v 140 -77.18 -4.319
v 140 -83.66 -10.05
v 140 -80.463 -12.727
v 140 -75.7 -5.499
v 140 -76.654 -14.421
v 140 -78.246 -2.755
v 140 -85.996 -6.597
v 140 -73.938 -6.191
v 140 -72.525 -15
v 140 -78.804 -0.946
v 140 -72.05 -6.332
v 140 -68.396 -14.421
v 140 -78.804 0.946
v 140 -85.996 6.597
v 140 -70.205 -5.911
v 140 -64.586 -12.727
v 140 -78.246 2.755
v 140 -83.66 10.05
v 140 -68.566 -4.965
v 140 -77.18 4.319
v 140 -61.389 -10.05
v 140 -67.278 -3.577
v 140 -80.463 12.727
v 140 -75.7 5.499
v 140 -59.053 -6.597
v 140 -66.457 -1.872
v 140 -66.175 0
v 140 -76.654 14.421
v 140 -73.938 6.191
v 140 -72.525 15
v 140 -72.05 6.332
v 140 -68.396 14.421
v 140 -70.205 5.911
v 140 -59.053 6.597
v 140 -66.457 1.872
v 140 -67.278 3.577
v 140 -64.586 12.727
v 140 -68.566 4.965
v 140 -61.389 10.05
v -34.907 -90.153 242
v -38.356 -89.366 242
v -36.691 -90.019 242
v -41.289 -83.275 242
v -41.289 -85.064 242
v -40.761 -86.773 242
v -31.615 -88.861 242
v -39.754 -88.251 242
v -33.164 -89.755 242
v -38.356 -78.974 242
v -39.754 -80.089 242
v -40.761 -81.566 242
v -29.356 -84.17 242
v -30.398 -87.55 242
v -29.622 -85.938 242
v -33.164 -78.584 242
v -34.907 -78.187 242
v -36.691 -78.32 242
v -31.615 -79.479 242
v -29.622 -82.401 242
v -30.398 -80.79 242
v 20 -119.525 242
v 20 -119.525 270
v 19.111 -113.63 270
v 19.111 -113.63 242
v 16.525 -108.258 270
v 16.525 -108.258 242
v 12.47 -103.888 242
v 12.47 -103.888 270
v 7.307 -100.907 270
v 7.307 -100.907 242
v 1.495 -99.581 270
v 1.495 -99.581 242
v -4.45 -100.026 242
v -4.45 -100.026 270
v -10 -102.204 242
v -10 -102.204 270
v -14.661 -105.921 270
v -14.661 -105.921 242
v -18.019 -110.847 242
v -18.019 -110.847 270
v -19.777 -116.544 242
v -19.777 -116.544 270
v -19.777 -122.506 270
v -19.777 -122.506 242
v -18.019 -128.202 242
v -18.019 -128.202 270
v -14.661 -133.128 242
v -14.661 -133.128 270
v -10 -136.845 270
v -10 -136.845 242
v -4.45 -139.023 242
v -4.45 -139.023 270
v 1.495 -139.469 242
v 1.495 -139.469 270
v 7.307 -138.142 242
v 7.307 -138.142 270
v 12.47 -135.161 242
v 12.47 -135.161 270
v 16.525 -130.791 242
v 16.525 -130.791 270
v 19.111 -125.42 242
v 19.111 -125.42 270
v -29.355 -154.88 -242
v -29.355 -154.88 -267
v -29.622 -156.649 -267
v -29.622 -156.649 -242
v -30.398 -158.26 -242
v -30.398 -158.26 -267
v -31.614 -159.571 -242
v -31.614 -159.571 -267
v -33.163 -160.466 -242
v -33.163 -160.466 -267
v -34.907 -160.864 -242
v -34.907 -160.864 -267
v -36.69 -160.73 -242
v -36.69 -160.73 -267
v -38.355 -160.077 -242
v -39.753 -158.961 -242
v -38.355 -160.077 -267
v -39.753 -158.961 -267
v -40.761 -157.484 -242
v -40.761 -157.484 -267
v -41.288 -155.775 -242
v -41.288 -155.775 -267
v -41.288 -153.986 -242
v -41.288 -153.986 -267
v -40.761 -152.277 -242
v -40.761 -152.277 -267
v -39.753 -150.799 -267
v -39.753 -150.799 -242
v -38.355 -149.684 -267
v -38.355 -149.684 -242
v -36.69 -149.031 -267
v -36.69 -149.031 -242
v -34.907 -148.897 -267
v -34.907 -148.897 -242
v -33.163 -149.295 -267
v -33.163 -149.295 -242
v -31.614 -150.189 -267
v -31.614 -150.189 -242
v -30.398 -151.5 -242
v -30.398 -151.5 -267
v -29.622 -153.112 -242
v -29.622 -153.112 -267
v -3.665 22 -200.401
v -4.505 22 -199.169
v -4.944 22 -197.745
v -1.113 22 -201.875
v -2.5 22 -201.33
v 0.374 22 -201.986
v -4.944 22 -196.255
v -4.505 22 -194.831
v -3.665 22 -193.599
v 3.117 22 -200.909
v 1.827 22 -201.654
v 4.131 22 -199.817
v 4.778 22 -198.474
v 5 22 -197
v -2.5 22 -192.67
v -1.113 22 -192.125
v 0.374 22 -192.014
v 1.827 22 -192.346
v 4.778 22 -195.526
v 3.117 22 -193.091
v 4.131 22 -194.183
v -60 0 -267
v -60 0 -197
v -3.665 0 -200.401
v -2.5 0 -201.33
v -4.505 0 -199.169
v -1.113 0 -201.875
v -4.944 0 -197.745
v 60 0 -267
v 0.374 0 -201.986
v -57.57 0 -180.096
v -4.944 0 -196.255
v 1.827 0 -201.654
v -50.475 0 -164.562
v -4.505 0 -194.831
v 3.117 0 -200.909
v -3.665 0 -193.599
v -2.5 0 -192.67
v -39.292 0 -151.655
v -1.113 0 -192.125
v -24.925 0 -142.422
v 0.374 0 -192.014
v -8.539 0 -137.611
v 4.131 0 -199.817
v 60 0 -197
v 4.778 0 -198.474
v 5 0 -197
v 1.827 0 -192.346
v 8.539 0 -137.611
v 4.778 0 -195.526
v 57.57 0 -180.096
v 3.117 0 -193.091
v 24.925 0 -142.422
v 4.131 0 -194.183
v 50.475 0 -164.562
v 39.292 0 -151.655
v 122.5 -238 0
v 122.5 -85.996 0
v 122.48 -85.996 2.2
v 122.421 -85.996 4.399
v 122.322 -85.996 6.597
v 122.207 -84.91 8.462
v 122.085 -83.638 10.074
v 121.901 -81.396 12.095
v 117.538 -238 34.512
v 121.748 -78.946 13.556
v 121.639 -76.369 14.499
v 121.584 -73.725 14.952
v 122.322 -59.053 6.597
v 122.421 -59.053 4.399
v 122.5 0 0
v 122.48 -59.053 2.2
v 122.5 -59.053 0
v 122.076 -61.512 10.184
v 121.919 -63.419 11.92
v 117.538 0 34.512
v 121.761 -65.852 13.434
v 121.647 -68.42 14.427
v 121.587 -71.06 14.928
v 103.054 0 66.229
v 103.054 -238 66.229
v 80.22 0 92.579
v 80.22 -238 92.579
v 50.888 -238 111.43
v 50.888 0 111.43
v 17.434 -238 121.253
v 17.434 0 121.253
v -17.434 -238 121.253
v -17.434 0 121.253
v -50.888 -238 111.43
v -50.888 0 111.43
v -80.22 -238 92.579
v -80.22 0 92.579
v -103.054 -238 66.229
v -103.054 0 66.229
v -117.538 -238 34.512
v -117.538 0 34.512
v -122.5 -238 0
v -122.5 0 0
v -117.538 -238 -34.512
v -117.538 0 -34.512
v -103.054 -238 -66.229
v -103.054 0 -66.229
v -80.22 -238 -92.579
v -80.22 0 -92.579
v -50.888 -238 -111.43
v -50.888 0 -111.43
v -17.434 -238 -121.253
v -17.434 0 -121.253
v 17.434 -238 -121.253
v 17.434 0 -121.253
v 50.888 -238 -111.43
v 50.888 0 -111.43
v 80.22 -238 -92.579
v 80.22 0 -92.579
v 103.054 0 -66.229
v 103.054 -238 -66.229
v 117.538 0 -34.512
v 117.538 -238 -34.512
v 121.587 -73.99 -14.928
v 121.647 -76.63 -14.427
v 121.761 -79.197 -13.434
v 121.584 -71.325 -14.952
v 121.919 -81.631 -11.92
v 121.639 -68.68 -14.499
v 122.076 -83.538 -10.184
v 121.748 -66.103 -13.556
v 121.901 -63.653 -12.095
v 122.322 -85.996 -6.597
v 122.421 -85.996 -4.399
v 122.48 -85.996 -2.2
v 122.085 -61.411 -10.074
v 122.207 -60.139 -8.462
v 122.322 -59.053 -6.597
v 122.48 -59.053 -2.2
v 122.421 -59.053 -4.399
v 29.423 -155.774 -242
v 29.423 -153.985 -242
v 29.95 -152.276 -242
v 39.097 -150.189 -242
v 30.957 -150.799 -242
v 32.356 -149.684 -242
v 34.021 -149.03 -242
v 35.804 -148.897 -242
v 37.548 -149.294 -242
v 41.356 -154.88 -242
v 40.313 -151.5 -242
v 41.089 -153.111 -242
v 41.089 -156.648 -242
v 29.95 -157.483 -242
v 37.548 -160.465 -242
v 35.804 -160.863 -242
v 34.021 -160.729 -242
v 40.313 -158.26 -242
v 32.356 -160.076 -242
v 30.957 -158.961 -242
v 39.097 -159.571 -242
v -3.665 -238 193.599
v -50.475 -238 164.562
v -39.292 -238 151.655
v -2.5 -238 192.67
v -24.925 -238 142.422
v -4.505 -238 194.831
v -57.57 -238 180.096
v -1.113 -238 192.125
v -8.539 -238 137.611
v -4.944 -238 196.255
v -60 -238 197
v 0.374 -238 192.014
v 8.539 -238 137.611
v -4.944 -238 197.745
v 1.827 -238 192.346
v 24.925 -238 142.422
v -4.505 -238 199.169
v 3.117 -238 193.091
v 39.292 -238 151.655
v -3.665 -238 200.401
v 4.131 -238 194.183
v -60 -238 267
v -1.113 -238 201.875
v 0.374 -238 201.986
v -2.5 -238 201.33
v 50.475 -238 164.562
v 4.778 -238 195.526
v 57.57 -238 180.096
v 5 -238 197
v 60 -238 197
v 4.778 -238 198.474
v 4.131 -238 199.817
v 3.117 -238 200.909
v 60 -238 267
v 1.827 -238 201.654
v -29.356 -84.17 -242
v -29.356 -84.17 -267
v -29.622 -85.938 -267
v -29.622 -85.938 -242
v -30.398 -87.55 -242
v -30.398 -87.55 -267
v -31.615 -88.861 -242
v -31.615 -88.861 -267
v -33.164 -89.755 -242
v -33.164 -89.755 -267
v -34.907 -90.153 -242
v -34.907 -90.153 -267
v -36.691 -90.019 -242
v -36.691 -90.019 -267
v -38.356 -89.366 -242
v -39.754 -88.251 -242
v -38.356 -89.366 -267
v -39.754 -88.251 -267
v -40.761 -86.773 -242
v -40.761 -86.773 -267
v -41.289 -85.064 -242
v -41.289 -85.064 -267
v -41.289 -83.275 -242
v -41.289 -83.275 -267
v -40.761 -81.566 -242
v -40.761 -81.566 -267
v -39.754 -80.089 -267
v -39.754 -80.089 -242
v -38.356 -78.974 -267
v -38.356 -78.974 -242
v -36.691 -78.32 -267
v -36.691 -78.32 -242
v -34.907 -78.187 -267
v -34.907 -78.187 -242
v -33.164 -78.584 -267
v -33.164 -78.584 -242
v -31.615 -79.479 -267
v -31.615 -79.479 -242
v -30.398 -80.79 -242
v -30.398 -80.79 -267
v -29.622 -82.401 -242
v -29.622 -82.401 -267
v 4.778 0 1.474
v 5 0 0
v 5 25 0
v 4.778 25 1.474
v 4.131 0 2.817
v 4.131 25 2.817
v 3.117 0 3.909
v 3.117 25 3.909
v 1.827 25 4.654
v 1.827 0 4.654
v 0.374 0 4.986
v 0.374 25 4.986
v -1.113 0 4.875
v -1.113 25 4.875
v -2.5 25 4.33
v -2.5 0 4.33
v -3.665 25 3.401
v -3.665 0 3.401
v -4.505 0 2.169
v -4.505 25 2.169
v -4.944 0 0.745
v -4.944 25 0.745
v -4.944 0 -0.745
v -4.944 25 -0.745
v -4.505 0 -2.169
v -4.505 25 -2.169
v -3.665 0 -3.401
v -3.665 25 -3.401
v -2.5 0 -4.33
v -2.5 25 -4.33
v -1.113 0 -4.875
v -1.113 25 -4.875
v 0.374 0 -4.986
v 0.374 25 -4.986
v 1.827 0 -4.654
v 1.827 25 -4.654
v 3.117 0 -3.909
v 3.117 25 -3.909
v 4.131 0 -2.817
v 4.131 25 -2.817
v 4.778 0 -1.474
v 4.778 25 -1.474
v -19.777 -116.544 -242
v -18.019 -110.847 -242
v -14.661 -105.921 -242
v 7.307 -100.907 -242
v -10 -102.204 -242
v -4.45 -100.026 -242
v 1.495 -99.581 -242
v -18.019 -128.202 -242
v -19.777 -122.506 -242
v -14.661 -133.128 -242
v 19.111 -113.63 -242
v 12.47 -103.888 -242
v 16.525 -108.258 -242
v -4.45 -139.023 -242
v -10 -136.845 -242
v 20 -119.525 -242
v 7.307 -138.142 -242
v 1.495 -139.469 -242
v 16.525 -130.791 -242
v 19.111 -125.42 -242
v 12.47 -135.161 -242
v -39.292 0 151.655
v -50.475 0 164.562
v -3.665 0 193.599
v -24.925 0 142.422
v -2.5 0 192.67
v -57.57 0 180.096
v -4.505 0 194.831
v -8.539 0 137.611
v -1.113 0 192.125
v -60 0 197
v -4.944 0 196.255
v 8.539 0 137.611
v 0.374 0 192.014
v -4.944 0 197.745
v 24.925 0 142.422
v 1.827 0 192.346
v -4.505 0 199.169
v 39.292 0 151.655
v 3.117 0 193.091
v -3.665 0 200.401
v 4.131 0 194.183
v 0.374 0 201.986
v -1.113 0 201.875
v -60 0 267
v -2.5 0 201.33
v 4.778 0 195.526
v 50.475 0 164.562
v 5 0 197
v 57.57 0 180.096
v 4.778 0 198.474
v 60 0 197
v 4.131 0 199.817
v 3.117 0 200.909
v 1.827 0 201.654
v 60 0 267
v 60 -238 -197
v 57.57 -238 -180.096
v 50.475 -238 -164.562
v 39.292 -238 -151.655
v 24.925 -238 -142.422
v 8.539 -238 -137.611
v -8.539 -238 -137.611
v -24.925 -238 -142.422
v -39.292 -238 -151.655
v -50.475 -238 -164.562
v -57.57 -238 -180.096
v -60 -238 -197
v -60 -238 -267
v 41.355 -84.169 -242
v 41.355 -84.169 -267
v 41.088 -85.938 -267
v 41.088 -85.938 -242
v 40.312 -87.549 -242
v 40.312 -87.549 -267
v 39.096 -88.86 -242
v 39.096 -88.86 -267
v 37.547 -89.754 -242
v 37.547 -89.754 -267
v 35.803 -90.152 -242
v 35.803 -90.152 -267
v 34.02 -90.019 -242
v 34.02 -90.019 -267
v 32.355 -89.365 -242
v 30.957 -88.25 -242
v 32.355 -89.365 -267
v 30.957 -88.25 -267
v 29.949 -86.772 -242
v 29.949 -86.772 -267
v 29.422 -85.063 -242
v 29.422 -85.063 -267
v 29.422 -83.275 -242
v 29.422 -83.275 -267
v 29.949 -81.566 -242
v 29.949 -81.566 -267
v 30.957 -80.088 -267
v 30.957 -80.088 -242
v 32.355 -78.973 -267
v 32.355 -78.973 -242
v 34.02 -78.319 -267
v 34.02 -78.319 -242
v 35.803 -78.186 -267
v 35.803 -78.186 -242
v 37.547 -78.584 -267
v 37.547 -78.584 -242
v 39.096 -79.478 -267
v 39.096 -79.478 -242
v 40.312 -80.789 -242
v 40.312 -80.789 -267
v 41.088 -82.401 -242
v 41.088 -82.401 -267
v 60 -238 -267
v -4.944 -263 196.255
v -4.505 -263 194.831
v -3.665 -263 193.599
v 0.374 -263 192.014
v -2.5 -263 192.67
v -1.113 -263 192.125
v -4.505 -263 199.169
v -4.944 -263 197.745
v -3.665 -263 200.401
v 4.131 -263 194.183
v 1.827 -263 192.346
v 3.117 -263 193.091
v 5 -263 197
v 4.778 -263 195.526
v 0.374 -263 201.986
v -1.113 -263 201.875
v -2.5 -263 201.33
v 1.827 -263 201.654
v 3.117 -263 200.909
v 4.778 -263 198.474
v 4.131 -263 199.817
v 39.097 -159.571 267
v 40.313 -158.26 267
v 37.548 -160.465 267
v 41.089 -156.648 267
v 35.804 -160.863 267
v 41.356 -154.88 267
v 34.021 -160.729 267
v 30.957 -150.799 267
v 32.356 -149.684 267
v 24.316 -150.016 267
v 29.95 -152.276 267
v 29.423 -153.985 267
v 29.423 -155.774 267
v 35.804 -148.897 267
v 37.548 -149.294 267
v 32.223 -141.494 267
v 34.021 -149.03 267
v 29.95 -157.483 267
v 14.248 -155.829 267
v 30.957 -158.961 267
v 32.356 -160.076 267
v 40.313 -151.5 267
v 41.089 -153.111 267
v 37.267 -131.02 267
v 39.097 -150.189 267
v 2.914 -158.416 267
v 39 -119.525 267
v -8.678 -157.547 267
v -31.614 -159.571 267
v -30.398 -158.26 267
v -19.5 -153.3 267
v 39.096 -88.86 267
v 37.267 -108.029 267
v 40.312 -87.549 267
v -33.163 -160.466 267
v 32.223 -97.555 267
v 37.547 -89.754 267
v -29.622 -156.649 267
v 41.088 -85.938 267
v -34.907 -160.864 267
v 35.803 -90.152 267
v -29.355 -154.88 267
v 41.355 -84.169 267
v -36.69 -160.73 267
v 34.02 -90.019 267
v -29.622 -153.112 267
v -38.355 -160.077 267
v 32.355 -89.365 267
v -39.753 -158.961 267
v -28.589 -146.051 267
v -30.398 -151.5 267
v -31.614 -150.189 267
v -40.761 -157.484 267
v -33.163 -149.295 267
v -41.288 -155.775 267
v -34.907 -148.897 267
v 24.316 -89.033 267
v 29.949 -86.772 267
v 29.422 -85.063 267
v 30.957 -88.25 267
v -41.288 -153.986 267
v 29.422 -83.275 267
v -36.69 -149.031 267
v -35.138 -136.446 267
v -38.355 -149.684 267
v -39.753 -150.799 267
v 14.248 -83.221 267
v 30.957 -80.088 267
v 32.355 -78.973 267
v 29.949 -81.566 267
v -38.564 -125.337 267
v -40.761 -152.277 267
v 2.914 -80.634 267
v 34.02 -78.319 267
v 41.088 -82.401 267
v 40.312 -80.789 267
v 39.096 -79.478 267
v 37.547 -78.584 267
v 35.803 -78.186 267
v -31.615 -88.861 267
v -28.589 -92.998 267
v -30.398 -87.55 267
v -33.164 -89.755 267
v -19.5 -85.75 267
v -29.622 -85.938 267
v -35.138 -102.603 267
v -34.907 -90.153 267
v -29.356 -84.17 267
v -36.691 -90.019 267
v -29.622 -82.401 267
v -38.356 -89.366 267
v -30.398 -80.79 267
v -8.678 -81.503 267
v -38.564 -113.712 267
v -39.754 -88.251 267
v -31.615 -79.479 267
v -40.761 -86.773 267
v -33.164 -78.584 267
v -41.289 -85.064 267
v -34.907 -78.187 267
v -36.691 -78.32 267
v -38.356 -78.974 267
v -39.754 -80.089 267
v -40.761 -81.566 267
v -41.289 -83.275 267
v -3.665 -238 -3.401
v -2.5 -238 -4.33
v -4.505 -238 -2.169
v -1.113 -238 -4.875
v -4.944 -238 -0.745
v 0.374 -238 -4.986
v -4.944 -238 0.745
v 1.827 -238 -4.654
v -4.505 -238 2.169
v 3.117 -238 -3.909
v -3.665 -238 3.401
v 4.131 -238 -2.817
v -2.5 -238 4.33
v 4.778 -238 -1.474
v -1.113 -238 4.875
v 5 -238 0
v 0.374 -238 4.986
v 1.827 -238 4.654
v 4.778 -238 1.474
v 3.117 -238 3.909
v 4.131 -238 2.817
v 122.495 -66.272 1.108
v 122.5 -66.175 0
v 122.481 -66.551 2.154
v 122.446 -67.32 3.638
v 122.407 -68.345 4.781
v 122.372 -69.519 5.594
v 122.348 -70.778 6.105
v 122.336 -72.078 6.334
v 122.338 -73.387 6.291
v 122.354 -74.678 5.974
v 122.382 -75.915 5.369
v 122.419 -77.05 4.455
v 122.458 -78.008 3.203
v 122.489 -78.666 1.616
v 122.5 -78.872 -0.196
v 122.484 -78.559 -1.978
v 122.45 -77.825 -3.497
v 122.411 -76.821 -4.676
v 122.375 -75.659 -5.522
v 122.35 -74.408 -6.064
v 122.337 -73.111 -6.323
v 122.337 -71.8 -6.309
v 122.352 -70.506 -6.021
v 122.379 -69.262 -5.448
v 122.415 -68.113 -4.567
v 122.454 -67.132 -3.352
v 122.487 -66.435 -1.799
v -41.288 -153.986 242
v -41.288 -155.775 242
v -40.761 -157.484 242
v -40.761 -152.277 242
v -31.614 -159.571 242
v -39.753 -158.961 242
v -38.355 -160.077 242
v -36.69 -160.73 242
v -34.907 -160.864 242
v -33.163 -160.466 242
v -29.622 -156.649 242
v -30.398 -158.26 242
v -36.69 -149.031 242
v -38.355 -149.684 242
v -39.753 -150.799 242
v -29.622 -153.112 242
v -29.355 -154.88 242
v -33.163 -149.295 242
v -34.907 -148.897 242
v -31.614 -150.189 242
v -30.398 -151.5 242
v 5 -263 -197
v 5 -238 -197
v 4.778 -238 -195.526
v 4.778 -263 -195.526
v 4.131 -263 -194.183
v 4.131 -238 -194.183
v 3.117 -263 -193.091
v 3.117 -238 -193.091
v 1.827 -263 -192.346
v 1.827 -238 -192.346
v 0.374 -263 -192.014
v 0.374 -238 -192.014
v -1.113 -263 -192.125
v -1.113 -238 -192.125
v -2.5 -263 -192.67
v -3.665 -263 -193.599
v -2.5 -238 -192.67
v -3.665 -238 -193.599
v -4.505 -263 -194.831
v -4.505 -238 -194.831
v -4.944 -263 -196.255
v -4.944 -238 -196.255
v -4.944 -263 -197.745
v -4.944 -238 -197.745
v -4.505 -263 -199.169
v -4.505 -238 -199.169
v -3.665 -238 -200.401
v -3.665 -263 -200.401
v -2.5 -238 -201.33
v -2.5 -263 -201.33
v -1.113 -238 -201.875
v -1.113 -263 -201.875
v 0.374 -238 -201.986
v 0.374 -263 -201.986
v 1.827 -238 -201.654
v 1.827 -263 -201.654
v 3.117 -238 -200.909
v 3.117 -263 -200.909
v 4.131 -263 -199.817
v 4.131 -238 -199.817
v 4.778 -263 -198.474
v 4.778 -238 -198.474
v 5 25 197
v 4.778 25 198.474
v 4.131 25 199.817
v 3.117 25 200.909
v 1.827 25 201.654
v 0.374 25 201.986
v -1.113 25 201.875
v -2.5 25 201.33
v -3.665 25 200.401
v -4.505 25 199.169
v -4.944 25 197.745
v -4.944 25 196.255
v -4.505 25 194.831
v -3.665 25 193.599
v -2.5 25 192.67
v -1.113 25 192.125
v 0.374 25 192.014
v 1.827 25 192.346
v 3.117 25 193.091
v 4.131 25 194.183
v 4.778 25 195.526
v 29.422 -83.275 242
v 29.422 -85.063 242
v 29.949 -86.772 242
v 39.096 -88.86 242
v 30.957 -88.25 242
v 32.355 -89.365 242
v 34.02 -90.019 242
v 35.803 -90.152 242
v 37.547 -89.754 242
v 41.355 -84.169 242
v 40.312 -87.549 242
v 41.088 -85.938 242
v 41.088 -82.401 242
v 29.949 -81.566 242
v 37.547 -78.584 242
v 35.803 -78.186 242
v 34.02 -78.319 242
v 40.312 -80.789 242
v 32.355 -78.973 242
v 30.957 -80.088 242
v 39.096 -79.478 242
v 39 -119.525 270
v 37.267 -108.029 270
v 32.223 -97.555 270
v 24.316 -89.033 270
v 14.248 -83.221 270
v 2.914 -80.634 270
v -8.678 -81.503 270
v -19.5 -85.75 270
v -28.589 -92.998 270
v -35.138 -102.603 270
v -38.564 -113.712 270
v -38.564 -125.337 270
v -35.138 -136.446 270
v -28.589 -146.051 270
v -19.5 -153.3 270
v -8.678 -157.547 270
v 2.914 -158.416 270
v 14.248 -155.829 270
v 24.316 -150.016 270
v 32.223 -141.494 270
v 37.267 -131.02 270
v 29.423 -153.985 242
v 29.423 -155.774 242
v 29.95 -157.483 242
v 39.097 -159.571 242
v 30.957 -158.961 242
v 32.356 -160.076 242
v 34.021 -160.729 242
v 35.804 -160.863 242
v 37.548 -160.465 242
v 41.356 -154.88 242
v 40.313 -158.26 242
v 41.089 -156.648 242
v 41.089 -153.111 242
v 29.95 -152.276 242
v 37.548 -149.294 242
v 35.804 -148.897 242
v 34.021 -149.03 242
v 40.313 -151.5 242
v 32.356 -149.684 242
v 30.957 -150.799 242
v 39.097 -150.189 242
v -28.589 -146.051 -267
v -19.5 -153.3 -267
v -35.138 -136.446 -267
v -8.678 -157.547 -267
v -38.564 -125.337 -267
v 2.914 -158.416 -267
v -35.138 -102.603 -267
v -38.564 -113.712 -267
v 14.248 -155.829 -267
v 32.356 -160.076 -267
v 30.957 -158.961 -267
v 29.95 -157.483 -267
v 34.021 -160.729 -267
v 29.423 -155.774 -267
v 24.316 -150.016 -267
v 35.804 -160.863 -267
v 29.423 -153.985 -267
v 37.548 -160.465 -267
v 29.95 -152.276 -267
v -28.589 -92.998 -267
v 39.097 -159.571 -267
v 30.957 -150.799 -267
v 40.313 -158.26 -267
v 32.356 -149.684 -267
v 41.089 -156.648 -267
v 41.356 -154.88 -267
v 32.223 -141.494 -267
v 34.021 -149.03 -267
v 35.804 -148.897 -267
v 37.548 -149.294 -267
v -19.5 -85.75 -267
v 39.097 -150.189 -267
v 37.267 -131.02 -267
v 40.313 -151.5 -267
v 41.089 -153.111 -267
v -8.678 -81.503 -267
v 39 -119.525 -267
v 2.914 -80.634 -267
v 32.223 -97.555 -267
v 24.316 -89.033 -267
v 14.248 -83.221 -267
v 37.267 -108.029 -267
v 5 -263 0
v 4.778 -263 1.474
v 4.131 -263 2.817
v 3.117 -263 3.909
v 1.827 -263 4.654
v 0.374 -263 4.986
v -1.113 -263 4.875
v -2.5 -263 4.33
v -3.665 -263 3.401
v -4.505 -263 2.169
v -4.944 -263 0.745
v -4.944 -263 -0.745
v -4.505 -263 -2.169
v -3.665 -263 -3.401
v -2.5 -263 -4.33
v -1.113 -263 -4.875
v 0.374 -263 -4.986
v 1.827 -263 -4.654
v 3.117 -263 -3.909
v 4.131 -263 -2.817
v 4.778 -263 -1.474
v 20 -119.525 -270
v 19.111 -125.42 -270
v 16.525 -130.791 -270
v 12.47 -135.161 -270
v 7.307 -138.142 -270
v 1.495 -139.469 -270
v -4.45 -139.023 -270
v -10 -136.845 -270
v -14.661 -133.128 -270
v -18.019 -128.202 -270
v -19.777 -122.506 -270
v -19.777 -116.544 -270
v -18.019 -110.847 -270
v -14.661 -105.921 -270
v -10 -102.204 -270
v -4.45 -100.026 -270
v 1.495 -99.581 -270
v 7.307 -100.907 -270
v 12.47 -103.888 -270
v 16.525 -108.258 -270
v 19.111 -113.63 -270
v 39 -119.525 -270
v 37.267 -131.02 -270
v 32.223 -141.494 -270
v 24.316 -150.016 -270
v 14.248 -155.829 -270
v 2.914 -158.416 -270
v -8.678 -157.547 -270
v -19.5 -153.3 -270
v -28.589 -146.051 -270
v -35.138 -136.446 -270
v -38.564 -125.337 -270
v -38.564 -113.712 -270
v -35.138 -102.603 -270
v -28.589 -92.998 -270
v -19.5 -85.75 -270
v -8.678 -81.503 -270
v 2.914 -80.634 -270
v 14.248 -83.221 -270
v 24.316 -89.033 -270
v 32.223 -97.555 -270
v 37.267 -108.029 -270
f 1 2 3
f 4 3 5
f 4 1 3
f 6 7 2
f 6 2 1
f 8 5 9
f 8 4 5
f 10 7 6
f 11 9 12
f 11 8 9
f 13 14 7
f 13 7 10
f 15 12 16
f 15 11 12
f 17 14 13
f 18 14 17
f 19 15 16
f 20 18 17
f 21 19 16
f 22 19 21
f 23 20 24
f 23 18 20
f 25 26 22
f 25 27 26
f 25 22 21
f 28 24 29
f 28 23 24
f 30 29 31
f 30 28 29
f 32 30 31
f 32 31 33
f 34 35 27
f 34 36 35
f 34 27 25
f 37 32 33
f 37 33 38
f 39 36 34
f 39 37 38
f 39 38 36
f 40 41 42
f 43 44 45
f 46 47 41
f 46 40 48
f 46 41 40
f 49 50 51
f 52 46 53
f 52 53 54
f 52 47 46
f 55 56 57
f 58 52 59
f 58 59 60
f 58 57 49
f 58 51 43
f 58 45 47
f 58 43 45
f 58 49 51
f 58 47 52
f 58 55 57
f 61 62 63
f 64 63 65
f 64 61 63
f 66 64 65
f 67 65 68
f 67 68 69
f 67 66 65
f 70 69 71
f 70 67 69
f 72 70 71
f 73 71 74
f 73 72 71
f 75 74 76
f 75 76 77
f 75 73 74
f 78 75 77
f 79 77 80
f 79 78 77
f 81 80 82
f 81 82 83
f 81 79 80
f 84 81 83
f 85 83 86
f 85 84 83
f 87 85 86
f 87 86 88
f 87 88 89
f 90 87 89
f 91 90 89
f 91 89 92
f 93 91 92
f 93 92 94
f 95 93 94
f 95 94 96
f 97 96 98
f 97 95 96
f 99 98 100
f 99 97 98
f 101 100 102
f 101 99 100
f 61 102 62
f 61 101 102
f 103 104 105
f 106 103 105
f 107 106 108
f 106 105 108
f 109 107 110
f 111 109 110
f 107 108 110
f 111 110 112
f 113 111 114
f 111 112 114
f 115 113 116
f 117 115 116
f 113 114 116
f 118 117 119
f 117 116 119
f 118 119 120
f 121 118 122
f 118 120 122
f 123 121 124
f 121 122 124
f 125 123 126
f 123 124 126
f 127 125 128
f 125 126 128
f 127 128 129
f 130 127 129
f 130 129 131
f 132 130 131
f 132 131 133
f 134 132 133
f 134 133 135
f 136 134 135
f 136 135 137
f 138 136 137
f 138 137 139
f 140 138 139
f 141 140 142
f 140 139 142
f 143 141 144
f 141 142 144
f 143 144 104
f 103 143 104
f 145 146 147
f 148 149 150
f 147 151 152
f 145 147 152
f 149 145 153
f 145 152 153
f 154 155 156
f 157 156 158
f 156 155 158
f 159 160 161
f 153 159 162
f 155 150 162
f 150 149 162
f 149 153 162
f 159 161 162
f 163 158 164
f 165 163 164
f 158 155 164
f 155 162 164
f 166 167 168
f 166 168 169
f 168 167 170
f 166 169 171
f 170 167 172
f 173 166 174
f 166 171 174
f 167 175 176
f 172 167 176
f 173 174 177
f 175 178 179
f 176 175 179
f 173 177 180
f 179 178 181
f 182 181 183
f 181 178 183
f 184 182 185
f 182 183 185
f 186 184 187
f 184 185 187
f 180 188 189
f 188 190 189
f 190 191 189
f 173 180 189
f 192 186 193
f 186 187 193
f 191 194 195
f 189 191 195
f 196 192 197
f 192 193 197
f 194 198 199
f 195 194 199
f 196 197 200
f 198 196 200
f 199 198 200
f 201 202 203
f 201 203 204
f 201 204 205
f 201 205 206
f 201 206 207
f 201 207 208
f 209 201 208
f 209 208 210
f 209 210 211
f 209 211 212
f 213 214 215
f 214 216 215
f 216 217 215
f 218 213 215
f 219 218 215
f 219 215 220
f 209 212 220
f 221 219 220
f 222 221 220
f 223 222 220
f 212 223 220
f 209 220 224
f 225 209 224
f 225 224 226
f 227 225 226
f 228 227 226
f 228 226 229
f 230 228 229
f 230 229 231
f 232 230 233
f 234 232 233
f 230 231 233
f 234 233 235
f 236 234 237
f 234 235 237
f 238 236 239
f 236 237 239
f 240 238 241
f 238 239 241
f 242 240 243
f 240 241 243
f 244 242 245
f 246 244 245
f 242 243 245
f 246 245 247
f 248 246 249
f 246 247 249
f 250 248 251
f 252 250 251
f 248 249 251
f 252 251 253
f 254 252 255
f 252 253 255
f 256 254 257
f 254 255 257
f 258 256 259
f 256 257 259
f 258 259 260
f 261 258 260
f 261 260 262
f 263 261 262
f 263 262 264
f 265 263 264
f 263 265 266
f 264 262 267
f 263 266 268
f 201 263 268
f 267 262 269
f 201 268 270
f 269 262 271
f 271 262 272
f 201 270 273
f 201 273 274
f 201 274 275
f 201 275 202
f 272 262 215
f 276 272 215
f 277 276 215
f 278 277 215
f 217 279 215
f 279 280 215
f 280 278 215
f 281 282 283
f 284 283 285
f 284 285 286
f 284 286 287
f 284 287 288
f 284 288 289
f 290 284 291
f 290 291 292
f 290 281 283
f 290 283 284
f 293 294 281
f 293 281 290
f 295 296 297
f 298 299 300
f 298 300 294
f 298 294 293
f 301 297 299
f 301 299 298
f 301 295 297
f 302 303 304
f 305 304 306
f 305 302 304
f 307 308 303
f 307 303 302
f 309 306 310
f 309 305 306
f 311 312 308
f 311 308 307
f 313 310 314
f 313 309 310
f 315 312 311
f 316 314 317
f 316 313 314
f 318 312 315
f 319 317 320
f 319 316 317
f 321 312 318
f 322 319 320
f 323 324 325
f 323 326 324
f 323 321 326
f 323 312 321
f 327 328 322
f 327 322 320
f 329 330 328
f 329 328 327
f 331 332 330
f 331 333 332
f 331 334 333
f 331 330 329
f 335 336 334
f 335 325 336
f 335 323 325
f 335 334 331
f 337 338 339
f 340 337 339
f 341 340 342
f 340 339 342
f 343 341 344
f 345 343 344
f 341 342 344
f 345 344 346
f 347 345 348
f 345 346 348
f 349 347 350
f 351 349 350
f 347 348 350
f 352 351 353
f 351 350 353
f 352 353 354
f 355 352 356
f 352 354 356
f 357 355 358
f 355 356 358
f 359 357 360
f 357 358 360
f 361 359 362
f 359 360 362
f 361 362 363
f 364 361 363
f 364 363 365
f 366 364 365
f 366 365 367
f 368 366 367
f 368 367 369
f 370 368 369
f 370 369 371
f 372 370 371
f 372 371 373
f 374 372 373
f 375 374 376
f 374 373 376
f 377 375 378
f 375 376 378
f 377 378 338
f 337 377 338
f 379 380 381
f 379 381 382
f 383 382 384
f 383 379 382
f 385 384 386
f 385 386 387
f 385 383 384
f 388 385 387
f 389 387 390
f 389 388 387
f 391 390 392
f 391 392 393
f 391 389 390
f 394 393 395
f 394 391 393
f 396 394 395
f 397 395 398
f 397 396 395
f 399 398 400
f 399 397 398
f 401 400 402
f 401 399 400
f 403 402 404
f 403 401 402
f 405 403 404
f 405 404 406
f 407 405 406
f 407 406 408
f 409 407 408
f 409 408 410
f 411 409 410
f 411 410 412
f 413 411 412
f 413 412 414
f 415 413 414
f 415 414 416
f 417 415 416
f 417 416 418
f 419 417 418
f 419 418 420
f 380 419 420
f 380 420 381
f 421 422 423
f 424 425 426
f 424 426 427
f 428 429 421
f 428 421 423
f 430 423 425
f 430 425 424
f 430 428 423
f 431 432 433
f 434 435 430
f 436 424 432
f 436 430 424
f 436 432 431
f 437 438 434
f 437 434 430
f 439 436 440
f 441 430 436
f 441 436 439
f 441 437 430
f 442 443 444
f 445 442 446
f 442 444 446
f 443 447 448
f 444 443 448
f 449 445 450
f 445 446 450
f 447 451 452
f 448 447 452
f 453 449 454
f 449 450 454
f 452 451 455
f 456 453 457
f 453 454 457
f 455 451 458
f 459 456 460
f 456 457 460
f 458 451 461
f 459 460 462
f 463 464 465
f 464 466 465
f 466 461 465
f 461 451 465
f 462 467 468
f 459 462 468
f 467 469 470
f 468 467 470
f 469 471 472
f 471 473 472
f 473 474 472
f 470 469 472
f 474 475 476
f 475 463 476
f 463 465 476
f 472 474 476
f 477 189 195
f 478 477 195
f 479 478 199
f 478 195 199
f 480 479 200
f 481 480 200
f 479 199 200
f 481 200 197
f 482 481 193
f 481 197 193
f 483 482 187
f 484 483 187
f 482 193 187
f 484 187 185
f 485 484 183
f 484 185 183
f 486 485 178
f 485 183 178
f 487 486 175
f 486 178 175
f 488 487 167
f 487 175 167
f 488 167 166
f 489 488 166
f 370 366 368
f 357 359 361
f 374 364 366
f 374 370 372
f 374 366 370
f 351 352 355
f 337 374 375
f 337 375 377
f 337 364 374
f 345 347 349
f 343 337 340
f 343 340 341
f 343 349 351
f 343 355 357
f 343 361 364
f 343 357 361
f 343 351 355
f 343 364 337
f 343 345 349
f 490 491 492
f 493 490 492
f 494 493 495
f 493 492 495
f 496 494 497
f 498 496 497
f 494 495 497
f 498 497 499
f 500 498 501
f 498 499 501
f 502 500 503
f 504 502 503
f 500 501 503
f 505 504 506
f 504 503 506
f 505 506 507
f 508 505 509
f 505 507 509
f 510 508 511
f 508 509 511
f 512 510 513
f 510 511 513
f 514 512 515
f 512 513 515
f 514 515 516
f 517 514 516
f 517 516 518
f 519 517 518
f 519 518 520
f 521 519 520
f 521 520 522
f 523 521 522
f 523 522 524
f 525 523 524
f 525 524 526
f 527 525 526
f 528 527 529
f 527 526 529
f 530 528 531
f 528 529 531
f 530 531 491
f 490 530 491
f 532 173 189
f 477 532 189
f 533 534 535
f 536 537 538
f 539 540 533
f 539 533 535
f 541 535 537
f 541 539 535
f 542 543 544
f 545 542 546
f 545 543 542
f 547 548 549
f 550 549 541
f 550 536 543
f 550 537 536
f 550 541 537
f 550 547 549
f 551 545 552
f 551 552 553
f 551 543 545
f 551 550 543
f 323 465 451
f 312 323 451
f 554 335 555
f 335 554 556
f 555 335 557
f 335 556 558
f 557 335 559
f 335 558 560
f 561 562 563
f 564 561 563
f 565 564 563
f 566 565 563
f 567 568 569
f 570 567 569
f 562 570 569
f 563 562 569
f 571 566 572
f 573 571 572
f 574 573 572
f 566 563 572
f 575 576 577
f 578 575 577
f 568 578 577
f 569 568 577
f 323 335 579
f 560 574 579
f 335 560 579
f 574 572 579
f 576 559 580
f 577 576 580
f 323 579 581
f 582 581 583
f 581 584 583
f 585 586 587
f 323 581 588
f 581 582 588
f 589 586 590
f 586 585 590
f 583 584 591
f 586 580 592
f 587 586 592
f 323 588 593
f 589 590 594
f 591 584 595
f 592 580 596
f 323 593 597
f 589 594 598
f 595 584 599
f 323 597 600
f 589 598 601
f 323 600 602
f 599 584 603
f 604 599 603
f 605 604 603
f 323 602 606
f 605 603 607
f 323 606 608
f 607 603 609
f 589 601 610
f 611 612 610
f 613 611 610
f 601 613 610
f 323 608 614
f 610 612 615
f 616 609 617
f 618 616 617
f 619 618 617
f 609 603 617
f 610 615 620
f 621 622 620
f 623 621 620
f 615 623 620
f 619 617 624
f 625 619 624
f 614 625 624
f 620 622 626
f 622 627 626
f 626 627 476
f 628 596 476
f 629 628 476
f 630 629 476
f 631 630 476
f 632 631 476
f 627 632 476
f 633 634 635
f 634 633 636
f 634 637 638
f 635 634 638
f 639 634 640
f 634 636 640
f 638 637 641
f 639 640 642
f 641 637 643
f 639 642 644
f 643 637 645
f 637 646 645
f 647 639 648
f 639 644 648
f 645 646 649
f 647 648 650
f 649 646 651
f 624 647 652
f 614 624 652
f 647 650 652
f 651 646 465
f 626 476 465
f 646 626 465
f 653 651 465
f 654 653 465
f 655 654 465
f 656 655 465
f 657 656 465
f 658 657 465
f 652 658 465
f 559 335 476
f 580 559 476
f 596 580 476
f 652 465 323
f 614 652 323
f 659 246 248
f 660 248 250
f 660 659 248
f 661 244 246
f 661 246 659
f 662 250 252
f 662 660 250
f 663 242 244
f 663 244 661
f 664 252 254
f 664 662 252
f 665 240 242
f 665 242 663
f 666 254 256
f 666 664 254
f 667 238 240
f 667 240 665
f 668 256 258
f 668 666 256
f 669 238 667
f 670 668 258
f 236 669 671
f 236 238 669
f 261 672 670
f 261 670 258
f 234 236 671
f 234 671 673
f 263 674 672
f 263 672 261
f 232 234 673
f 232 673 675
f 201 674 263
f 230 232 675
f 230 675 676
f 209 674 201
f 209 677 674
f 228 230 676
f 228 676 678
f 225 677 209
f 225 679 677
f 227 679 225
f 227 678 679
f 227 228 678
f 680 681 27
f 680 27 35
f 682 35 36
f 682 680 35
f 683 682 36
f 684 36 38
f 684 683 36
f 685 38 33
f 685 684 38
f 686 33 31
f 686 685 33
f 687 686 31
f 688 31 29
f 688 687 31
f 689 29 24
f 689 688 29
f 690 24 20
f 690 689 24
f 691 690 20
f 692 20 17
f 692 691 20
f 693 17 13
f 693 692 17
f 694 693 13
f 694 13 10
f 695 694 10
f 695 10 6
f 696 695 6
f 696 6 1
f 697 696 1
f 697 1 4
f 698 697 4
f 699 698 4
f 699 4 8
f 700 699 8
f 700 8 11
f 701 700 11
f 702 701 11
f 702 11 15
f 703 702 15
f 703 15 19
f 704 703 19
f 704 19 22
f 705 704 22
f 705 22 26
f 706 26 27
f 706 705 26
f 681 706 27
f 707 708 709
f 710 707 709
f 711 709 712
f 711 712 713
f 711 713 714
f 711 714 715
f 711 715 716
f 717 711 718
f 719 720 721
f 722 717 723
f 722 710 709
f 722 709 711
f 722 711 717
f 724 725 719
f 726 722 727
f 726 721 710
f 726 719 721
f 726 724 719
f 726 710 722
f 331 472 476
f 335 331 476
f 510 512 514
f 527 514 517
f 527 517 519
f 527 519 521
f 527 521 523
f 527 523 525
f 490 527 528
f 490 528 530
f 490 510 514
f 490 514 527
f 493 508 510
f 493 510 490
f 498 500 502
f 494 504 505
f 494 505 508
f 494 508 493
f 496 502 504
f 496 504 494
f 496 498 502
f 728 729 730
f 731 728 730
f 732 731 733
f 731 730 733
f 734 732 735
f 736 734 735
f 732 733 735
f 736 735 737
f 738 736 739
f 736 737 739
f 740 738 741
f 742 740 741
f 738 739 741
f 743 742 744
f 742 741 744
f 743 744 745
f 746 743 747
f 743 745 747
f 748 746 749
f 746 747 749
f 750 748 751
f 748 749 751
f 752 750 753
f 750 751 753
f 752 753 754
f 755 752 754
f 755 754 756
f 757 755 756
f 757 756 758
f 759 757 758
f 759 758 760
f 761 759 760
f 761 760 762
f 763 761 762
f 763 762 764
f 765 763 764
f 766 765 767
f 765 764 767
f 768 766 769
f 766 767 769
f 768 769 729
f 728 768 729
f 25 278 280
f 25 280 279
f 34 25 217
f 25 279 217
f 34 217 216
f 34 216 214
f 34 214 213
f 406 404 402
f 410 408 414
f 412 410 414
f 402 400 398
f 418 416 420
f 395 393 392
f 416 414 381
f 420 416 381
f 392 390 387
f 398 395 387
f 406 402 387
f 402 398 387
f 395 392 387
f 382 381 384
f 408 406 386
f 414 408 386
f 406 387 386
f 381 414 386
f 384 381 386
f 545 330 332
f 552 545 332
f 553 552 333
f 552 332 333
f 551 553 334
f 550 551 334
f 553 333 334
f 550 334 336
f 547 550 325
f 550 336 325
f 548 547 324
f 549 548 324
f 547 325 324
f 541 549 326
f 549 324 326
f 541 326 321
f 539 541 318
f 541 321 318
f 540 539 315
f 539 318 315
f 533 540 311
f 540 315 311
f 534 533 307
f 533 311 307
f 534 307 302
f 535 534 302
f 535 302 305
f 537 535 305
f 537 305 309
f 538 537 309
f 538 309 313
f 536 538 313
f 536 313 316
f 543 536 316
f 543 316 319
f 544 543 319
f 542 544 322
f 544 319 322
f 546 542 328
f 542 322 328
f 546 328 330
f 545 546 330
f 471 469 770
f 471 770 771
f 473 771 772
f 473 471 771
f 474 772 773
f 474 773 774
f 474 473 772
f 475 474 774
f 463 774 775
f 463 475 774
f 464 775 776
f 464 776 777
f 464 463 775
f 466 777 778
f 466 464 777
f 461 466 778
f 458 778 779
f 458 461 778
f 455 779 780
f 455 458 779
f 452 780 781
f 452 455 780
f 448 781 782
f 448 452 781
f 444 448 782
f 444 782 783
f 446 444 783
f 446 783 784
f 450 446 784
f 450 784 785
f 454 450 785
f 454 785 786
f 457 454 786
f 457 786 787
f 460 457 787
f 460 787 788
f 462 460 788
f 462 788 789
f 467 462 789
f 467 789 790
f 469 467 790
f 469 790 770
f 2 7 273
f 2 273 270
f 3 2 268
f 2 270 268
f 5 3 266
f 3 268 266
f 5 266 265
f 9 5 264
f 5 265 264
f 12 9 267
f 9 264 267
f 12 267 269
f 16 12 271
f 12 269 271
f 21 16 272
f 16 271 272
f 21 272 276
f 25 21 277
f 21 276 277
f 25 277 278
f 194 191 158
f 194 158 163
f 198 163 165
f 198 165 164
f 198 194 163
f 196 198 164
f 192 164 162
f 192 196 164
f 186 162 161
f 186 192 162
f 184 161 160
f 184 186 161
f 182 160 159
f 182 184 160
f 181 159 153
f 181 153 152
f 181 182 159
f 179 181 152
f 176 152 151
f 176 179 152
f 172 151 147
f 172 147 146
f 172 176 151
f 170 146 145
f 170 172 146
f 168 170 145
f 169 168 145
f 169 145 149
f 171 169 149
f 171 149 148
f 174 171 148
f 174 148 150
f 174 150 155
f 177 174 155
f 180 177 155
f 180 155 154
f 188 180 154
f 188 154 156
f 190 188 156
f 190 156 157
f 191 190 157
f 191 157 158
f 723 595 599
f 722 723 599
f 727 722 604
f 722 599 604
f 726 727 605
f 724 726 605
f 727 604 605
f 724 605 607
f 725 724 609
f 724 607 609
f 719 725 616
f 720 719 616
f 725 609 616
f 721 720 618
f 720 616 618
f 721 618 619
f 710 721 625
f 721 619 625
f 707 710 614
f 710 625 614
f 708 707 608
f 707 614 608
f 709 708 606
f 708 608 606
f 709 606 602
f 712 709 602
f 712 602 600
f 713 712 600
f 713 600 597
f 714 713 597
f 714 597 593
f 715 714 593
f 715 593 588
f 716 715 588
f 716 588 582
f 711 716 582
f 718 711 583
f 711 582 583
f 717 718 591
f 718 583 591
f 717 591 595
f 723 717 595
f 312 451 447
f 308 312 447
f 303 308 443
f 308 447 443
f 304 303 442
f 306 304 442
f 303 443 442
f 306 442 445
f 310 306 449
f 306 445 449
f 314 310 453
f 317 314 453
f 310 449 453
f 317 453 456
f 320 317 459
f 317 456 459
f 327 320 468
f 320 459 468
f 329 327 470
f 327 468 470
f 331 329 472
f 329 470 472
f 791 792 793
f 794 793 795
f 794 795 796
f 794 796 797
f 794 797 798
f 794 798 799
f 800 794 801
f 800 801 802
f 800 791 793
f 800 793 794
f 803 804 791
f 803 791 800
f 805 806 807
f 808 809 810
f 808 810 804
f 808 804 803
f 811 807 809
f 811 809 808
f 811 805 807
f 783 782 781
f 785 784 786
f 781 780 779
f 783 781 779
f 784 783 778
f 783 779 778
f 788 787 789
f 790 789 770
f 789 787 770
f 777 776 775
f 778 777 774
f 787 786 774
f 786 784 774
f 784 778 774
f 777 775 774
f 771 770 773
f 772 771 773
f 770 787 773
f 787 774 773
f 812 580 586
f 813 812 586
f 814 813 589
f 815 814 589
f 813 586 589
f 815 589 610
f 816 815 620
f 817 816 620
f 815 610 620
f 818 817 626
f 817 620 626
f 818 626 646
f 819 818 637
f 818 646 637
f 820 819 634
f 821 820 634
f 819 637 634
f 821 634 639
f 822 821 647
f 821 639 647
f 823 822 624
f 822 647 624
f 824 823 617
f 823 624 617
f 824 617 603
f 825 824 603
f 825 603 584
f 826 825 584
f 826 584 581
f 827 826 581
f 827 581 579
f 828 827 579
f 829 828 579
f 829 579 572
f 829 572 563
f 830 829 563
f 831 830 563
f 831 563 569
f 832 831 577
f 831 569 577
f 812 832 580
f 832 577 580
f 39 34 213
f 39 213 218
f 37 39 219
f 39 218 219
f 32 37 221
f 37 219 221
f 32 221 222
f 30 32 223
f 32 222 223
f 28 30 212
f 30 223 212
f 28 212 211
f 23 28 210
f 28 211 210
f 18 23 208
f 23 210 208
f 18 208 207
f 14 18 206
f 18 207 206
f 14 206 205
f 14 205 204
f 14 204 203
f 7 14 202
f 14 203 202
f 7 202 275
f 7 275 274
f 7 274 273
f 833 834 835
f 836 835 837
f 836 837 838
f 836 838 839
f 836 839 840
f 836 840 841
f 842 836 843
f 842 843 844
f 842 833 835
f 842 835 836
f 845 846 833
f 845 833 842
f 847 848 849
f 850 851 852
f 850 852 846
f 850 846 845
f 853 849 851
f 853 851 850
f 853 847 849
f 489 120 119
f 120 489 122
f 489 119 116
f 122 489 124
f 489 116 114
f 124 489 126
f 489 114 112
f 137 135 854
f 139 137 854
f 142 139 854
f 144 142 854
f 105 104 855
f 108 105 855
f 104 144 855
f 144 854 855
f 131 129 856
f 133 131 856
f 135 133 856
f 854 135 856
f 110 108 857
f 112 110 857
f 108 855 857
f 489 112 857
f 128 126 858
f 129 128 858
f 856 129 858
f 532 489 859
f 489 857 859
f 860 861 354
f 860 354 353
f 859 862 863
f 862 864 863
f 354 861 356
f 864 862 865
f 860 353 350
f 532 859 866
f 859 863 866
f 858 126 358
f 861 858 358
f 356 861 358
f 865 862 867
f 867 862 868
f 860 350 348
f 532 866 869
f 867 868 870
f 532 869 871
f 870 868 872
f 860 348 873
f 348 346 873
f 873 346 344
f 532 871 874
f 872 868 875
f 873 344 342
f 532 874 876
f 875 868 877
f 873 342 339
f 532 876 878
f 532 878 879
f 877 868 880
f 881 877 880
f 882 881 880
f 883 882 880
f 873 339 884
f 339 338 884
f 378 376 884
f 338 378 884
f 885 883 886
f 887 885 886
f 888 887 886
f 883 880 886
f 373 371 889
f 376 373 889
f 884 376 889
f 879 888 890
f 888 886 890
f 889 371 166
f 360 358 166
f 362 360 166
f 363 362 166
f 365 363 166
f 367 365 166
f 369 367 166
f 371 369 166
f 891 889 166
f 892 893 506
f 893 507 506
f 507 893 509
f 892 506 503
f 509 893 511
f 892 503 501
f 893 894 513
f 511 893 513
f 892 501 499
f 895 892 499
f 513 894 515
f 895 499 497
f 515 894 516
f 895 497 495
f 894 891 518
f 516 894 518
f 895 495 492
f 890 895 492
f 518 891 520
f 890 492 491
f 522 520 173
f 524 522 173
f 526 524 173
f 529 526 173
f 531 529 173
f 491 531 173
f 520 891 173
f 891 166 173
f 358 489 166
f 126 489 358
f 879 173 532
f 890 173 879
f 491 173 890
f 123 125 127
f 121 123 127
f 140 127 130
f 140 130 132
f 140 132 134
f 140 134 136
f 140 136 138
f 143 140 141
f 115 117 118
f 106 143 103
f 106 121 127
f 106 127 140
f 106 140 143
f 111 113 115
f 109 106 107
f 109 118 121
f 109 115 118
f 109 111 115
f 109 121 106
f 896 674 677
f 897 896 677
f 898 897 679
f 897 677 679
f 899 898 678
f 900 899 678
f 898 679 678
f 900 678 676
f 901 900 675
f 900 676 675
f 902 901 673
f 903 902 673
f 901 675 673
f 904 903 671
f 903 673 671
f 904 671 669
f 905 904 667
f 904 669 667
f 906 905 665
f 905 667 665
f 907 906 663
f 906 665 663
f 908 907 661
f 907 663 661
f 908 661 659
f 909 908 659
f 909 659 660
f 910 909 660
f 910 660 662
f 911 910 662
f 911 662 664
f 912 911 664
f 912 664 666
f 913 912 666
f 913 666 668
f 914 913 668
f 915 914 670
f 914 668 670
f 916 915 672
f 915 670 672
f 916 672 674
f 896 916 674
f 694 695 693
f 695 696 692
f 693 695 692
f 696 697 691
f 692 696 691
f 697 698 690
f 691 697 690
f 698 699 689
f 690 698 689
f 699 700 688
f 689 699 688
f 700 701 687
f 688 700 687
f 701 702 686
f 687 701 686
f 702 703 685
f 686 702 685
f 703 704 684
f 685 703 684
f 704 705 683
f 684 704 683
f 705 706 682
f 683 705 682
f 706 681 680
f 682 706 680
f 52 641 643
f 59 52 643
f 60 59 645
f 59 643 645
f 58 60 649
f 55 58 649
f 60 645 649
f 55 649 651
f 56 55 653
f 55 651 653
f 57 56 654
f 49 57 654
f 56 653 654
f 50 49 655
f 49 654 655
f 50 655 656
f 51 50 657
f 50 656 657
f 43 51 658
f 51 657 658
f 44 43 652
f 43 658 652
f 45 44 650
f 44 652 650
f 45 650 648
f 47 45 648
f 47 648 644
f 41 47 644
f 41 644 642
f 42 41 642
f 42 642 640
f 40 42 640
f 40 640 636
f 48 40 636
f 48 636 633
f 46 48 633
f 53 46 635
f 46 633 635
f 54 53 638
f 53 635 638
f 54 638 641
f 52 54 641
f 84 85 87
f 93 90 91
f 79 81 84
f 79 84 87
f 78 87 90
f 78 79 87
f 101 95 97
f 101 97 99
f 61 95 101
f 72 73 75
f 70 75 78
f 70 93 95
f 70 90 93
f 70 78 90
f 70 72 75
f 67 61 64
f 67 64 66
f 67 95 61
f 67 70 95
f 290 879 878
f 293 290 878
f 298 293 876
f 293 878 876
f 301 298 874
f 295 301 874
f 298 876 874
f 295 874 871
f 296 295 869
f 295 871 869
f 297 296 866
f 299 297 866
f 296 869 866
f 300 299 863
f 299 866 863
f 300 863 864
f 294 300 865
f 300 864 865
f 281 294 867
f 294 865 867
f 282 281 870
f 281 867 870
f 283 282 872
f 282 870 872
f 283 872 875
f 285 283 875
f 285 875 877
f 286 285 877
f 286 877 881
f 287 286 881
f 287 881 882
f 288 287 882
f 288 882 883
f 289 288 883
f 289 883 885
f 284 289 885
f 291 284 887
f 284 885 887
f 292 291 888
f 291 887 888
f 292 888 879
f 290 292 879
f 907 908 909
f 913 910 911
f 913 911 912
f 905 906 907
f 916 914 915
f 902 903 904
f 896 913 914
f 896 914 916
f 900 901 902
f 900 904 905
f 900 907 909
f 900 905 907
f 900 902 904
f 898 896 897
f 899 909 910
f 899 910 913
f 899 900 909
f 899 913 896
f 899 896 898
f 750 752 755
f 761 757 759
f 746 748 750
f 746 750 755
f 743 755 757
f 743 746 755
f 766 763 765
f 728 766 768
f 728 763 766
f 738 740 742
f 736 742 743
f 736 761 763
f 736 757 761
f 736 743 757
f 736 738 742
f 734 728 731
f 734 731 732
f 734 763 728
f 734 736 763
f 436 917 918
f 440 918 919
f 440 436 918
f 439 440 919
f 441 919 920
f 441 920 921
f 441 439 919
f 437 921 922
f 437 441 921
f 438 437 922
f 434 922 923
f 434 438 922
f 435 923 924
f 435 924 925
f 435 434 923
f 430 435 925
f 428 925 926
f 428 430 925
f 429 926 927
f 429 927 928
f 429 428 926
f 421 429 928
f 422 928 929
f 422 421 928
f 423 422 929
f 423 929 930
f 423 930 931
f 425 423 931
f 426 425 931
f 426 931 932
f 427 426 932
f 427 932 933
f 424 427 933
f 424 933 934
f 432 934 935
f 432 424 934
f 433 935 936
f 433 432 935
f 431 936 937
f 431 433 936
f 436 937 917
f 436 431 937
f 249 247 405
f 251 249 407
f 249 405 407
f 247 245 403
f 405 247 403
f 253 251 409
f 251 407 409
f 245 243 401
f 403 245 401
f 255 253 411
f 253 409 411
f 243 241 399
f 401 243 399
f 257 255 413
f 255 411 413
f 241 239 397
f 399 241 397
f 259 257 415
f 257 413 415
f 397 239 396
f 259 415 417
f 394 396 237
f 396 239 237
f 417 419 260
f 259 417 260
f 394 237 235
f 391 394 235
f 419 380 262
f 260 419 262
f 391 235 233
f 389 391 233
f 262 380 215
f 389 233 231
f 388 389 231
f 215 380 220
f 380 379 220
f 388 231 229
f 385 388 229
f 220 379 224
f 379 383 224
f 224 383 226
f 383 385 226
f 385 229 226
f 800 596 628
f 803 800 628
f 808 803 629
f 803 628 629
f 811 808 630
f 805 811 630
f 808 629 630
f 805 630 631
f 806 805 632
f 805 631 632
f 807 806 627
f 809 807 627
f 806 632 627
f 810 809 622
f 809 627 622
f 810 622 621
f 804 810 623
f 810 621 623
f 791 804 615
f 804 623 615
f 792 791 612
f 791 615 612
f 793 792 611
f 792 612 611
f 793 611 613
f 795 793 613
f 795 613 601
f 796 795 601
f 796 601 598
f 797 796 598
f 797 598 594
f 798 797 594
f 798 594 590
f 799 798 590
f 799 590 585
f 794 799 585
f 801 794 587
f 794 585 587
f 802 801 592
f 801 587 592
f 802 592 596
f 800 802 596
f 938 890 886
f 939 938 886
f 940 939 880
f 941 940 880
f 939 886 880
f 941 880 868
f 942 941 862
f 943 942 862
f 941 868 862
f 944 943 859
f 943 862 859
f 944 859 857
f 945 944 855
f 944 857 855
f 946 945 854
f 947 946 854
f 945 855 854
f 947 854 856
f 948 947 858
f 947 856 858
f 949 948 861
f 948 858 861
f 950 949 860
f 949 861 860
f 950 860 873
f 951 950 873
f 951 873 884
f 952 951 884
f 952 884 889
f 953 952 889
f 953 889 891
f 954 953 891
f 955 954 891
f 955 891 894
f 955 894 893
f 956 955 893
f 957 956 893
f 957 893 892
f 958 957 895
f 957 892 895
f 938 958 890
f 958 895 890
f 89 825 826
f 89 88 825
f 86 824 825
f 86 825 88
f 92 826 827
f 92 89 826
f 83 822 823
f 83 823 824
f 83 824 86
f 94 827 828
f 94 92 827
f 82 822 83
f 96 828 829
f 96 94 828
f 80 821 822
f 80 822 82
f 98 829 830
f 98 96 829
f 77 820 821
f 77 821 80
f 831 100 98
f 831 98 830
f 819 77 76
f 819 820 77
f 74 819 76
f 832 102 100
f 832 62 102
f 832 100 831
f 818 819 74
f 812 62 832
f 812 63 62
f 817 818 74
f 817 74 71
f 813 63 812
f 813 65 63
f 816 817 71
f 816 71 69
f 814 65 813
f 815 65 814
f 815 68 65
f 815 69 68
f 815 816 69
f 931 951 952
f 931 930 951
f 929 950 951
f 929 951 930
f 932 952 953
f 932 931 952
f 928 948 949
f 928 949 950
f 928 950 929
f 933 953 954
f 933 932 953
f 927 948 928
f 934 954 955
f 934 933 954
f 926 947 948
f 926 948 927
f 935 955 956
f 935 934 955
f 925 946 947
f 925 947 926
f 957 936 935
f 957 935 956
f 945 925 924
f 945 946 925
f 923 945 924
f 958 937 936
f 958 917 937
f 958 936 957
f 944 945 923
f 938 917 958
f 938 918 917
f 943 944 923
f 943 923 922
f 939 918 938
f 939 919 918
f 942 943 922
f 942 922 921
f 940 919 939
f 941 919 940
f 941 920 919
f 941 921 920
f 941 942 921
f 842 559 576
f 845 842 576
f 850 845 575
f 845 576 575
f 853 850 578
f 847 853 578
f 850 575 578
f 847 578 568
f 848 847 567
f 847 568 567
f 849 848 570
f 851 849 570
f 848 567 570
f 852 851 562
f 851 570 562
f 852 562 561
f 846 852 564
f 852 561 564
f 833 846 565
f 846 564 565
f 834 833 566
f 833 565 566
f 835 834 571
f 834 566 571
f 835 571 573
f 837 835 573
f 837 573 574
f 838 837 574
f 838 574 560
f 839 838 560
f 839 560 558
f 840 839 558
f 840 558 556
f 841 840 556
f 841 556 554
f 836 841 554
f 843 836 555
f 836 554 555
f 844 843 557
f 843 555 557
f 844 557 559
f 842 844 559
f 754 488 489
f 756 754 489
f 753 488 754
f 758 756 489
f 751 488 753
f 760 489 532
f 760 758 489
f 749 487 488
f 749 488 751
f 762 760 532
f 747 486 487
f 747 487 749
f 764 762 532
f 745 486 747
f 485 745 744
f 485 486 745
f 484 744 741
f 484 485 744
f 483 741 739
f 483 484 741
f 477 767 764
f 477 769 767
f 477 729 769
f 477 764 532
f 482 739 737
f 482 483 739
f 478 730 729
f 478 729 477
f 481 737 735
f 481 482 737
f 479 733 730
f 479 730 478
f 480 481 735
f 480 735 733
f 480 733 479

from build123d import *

# Parameters (mm, degrees)
F0_R          = 122.5
F2_DEPTH      = 238
F3_R          = 5
F4_DEPTH      = 25
F4_DEPTH_BACK = 263
F5_DEPTH      = 25
F5_DEPTH_BACK = 263
F6_DEPTH      = 25
F6_DEPTH_BACK = 260
F7_R          = 20
F7_R_2        = 6
F8_DEPTH      = 25
F7_R_3        = 39
F9_DEPTH      = 3
F10_R         = 20
F10_R_2       = 6
F11_DEPTH     = 25
F10_R_3       = 39
F12_DEPTH     = 3
F13_R         = 6.35
F14_DEPTH     = 140


with BuildPart() as f2:
    # F1 (on face) + F0 (on Front) → F2 (new body)
    with BuildSketch(Plane.XZ):
        with BuildLine():
            Line((-60, 267), (-60, 197))
            ThreePointArc((-60, 197), (0, 137), (60, 197))
            Line((60, 197), (60, 267))
            Line((60, 267), (-60, 267))
        make_face()
        with BuildLine():
            ThreePointArc((60, -197), (0, -137), (-60, -197))
            Line((-60, -197), (-60, -267))
            Line((-60, -267), (60, -267))
            Line((60, -267), (60, -197))
        make_face()
    with BuildSketch(Plane.XZ):
        Circle(F0_R)
    extrude(amount=F2_DEPTH)

    # F3 (on face) → F4 (join, two sides)
    with BuildSketch(Plane.XZ.offset(238)) as f4_sk:
        with Locations((0, 197)):
            Circle(F3_R)
    extrude(amount=F4_DEPTH)
    extrude(f4_sk.sketch, amount=-F4_DEPTH_BACK)

    # F3 (on face) → F5 (join, two sides)
    with BuildSketch(Plane.XZ.offset(238)) as f5_sk:
        Circle(F3_R)
    extrude(amount=F5_DEPTH)
    extrude(f5_sk.sketch, amount=-F5_DEPTH_BACK)

    # F3 (on face) → F6 (join, two sides)
    with BuildSketch(Plane.XZ.offset(238)) as f6_sk:
        with Locations((0, -197)):
            Circle(F3_R)
    extrude(amount=F6_DEPTH)
    extrude(f6_sk.sketch, amount=-F6_DEPTH_BACK)

    # F7 (on face) → F8 (cut)
    with BuildSketch(Plane.XY.offset(267)):
        with Locations((0, -119.524725)):
            Circle(F7_R)
        with Locations((-35.355, -154.880403)):
            Circle(F7_R_2)
        with Locations((35.355678, -154.879725)):
            Circle(F7_R_2)
        with Locations((35.355, -84.169047)):
            Circle(F7_R_2)
        with Locations((-35.355678, -84.169725)):
            Circle(F7_R_2)
    extrude(amount=-F8_DEPTH, mode=Mode.SUBTRACT)

    # F7 (on face) → F9 (join)
    with BuildSketch(Plane.XY.offset(267)):
        with Locations((0, -119.524725)):
            Circle(F7_R_3)
        with Locations((0, -119.524725)):
            Circle(F7_R, mode=Mode.SUBTRACT)
    extrude(amount=F9_DEPTH)

    # F10 (on face) → F11 (cut)
    with BuildSketch(Plane(origin=(0, 0, -267), x_dir=(1, 0, 0), z_dir=(0, 0, -1))):
        with Locations((0, 119.524725)):
            Circle(F10_R)
        with Locations((35.355678, 154.879725)):
            Circle(F10_R_2)
        with Locations((35.355, 84.169047)):
            Circle(F10_R_2)
        with Locations((-35.355, 154.880403)):
            Circle(F10_R_2)
        with Locations((-35.355678, 84.169725)):
            Circle(F10_R_2)
    extrude(amount=-F11_DEPTH, mode=Mode.SUBTRACT)

    # F10 (on face) → F12 (join)
    with BuildSketch(Plane(origin=(0, 0, -267), x_dir=(1, 0, 0), z_dir=(0, 0, -1))):
        with Locations((0, 119.524725)):
            Circle(F10_R_3)
        with Locations((0, 119.524725)):
            Circle(F10_R, mode=Mode.SUBTRACT)
    extrude(amount=F12_DEPTH)

    # F13 (on Right) → F14 (join)
    with BuildSketch(Plane.YZ):
        with BuildLine():
            Line((-85.996222, 6.596875), (-85.996222, -6.596875))
            ThreePointArc((-85.996222, -6.596875), (-72.524725, -15), (-59.053228, -6.596875))
            Line((-59.053228, -6.596875), (-59.053228, 6.596875))
            ThreePointArc((-59.053228, 6.596875), (-72.524725, 15), (-85.996222, 6.596875))
        make_face()
        with Locations((-72.524725, 0)):
            Circle(F13_R, mode=Mode.SUBTRACT)
    extrude(amount=F14_DEPTH)


solid = f2.part
